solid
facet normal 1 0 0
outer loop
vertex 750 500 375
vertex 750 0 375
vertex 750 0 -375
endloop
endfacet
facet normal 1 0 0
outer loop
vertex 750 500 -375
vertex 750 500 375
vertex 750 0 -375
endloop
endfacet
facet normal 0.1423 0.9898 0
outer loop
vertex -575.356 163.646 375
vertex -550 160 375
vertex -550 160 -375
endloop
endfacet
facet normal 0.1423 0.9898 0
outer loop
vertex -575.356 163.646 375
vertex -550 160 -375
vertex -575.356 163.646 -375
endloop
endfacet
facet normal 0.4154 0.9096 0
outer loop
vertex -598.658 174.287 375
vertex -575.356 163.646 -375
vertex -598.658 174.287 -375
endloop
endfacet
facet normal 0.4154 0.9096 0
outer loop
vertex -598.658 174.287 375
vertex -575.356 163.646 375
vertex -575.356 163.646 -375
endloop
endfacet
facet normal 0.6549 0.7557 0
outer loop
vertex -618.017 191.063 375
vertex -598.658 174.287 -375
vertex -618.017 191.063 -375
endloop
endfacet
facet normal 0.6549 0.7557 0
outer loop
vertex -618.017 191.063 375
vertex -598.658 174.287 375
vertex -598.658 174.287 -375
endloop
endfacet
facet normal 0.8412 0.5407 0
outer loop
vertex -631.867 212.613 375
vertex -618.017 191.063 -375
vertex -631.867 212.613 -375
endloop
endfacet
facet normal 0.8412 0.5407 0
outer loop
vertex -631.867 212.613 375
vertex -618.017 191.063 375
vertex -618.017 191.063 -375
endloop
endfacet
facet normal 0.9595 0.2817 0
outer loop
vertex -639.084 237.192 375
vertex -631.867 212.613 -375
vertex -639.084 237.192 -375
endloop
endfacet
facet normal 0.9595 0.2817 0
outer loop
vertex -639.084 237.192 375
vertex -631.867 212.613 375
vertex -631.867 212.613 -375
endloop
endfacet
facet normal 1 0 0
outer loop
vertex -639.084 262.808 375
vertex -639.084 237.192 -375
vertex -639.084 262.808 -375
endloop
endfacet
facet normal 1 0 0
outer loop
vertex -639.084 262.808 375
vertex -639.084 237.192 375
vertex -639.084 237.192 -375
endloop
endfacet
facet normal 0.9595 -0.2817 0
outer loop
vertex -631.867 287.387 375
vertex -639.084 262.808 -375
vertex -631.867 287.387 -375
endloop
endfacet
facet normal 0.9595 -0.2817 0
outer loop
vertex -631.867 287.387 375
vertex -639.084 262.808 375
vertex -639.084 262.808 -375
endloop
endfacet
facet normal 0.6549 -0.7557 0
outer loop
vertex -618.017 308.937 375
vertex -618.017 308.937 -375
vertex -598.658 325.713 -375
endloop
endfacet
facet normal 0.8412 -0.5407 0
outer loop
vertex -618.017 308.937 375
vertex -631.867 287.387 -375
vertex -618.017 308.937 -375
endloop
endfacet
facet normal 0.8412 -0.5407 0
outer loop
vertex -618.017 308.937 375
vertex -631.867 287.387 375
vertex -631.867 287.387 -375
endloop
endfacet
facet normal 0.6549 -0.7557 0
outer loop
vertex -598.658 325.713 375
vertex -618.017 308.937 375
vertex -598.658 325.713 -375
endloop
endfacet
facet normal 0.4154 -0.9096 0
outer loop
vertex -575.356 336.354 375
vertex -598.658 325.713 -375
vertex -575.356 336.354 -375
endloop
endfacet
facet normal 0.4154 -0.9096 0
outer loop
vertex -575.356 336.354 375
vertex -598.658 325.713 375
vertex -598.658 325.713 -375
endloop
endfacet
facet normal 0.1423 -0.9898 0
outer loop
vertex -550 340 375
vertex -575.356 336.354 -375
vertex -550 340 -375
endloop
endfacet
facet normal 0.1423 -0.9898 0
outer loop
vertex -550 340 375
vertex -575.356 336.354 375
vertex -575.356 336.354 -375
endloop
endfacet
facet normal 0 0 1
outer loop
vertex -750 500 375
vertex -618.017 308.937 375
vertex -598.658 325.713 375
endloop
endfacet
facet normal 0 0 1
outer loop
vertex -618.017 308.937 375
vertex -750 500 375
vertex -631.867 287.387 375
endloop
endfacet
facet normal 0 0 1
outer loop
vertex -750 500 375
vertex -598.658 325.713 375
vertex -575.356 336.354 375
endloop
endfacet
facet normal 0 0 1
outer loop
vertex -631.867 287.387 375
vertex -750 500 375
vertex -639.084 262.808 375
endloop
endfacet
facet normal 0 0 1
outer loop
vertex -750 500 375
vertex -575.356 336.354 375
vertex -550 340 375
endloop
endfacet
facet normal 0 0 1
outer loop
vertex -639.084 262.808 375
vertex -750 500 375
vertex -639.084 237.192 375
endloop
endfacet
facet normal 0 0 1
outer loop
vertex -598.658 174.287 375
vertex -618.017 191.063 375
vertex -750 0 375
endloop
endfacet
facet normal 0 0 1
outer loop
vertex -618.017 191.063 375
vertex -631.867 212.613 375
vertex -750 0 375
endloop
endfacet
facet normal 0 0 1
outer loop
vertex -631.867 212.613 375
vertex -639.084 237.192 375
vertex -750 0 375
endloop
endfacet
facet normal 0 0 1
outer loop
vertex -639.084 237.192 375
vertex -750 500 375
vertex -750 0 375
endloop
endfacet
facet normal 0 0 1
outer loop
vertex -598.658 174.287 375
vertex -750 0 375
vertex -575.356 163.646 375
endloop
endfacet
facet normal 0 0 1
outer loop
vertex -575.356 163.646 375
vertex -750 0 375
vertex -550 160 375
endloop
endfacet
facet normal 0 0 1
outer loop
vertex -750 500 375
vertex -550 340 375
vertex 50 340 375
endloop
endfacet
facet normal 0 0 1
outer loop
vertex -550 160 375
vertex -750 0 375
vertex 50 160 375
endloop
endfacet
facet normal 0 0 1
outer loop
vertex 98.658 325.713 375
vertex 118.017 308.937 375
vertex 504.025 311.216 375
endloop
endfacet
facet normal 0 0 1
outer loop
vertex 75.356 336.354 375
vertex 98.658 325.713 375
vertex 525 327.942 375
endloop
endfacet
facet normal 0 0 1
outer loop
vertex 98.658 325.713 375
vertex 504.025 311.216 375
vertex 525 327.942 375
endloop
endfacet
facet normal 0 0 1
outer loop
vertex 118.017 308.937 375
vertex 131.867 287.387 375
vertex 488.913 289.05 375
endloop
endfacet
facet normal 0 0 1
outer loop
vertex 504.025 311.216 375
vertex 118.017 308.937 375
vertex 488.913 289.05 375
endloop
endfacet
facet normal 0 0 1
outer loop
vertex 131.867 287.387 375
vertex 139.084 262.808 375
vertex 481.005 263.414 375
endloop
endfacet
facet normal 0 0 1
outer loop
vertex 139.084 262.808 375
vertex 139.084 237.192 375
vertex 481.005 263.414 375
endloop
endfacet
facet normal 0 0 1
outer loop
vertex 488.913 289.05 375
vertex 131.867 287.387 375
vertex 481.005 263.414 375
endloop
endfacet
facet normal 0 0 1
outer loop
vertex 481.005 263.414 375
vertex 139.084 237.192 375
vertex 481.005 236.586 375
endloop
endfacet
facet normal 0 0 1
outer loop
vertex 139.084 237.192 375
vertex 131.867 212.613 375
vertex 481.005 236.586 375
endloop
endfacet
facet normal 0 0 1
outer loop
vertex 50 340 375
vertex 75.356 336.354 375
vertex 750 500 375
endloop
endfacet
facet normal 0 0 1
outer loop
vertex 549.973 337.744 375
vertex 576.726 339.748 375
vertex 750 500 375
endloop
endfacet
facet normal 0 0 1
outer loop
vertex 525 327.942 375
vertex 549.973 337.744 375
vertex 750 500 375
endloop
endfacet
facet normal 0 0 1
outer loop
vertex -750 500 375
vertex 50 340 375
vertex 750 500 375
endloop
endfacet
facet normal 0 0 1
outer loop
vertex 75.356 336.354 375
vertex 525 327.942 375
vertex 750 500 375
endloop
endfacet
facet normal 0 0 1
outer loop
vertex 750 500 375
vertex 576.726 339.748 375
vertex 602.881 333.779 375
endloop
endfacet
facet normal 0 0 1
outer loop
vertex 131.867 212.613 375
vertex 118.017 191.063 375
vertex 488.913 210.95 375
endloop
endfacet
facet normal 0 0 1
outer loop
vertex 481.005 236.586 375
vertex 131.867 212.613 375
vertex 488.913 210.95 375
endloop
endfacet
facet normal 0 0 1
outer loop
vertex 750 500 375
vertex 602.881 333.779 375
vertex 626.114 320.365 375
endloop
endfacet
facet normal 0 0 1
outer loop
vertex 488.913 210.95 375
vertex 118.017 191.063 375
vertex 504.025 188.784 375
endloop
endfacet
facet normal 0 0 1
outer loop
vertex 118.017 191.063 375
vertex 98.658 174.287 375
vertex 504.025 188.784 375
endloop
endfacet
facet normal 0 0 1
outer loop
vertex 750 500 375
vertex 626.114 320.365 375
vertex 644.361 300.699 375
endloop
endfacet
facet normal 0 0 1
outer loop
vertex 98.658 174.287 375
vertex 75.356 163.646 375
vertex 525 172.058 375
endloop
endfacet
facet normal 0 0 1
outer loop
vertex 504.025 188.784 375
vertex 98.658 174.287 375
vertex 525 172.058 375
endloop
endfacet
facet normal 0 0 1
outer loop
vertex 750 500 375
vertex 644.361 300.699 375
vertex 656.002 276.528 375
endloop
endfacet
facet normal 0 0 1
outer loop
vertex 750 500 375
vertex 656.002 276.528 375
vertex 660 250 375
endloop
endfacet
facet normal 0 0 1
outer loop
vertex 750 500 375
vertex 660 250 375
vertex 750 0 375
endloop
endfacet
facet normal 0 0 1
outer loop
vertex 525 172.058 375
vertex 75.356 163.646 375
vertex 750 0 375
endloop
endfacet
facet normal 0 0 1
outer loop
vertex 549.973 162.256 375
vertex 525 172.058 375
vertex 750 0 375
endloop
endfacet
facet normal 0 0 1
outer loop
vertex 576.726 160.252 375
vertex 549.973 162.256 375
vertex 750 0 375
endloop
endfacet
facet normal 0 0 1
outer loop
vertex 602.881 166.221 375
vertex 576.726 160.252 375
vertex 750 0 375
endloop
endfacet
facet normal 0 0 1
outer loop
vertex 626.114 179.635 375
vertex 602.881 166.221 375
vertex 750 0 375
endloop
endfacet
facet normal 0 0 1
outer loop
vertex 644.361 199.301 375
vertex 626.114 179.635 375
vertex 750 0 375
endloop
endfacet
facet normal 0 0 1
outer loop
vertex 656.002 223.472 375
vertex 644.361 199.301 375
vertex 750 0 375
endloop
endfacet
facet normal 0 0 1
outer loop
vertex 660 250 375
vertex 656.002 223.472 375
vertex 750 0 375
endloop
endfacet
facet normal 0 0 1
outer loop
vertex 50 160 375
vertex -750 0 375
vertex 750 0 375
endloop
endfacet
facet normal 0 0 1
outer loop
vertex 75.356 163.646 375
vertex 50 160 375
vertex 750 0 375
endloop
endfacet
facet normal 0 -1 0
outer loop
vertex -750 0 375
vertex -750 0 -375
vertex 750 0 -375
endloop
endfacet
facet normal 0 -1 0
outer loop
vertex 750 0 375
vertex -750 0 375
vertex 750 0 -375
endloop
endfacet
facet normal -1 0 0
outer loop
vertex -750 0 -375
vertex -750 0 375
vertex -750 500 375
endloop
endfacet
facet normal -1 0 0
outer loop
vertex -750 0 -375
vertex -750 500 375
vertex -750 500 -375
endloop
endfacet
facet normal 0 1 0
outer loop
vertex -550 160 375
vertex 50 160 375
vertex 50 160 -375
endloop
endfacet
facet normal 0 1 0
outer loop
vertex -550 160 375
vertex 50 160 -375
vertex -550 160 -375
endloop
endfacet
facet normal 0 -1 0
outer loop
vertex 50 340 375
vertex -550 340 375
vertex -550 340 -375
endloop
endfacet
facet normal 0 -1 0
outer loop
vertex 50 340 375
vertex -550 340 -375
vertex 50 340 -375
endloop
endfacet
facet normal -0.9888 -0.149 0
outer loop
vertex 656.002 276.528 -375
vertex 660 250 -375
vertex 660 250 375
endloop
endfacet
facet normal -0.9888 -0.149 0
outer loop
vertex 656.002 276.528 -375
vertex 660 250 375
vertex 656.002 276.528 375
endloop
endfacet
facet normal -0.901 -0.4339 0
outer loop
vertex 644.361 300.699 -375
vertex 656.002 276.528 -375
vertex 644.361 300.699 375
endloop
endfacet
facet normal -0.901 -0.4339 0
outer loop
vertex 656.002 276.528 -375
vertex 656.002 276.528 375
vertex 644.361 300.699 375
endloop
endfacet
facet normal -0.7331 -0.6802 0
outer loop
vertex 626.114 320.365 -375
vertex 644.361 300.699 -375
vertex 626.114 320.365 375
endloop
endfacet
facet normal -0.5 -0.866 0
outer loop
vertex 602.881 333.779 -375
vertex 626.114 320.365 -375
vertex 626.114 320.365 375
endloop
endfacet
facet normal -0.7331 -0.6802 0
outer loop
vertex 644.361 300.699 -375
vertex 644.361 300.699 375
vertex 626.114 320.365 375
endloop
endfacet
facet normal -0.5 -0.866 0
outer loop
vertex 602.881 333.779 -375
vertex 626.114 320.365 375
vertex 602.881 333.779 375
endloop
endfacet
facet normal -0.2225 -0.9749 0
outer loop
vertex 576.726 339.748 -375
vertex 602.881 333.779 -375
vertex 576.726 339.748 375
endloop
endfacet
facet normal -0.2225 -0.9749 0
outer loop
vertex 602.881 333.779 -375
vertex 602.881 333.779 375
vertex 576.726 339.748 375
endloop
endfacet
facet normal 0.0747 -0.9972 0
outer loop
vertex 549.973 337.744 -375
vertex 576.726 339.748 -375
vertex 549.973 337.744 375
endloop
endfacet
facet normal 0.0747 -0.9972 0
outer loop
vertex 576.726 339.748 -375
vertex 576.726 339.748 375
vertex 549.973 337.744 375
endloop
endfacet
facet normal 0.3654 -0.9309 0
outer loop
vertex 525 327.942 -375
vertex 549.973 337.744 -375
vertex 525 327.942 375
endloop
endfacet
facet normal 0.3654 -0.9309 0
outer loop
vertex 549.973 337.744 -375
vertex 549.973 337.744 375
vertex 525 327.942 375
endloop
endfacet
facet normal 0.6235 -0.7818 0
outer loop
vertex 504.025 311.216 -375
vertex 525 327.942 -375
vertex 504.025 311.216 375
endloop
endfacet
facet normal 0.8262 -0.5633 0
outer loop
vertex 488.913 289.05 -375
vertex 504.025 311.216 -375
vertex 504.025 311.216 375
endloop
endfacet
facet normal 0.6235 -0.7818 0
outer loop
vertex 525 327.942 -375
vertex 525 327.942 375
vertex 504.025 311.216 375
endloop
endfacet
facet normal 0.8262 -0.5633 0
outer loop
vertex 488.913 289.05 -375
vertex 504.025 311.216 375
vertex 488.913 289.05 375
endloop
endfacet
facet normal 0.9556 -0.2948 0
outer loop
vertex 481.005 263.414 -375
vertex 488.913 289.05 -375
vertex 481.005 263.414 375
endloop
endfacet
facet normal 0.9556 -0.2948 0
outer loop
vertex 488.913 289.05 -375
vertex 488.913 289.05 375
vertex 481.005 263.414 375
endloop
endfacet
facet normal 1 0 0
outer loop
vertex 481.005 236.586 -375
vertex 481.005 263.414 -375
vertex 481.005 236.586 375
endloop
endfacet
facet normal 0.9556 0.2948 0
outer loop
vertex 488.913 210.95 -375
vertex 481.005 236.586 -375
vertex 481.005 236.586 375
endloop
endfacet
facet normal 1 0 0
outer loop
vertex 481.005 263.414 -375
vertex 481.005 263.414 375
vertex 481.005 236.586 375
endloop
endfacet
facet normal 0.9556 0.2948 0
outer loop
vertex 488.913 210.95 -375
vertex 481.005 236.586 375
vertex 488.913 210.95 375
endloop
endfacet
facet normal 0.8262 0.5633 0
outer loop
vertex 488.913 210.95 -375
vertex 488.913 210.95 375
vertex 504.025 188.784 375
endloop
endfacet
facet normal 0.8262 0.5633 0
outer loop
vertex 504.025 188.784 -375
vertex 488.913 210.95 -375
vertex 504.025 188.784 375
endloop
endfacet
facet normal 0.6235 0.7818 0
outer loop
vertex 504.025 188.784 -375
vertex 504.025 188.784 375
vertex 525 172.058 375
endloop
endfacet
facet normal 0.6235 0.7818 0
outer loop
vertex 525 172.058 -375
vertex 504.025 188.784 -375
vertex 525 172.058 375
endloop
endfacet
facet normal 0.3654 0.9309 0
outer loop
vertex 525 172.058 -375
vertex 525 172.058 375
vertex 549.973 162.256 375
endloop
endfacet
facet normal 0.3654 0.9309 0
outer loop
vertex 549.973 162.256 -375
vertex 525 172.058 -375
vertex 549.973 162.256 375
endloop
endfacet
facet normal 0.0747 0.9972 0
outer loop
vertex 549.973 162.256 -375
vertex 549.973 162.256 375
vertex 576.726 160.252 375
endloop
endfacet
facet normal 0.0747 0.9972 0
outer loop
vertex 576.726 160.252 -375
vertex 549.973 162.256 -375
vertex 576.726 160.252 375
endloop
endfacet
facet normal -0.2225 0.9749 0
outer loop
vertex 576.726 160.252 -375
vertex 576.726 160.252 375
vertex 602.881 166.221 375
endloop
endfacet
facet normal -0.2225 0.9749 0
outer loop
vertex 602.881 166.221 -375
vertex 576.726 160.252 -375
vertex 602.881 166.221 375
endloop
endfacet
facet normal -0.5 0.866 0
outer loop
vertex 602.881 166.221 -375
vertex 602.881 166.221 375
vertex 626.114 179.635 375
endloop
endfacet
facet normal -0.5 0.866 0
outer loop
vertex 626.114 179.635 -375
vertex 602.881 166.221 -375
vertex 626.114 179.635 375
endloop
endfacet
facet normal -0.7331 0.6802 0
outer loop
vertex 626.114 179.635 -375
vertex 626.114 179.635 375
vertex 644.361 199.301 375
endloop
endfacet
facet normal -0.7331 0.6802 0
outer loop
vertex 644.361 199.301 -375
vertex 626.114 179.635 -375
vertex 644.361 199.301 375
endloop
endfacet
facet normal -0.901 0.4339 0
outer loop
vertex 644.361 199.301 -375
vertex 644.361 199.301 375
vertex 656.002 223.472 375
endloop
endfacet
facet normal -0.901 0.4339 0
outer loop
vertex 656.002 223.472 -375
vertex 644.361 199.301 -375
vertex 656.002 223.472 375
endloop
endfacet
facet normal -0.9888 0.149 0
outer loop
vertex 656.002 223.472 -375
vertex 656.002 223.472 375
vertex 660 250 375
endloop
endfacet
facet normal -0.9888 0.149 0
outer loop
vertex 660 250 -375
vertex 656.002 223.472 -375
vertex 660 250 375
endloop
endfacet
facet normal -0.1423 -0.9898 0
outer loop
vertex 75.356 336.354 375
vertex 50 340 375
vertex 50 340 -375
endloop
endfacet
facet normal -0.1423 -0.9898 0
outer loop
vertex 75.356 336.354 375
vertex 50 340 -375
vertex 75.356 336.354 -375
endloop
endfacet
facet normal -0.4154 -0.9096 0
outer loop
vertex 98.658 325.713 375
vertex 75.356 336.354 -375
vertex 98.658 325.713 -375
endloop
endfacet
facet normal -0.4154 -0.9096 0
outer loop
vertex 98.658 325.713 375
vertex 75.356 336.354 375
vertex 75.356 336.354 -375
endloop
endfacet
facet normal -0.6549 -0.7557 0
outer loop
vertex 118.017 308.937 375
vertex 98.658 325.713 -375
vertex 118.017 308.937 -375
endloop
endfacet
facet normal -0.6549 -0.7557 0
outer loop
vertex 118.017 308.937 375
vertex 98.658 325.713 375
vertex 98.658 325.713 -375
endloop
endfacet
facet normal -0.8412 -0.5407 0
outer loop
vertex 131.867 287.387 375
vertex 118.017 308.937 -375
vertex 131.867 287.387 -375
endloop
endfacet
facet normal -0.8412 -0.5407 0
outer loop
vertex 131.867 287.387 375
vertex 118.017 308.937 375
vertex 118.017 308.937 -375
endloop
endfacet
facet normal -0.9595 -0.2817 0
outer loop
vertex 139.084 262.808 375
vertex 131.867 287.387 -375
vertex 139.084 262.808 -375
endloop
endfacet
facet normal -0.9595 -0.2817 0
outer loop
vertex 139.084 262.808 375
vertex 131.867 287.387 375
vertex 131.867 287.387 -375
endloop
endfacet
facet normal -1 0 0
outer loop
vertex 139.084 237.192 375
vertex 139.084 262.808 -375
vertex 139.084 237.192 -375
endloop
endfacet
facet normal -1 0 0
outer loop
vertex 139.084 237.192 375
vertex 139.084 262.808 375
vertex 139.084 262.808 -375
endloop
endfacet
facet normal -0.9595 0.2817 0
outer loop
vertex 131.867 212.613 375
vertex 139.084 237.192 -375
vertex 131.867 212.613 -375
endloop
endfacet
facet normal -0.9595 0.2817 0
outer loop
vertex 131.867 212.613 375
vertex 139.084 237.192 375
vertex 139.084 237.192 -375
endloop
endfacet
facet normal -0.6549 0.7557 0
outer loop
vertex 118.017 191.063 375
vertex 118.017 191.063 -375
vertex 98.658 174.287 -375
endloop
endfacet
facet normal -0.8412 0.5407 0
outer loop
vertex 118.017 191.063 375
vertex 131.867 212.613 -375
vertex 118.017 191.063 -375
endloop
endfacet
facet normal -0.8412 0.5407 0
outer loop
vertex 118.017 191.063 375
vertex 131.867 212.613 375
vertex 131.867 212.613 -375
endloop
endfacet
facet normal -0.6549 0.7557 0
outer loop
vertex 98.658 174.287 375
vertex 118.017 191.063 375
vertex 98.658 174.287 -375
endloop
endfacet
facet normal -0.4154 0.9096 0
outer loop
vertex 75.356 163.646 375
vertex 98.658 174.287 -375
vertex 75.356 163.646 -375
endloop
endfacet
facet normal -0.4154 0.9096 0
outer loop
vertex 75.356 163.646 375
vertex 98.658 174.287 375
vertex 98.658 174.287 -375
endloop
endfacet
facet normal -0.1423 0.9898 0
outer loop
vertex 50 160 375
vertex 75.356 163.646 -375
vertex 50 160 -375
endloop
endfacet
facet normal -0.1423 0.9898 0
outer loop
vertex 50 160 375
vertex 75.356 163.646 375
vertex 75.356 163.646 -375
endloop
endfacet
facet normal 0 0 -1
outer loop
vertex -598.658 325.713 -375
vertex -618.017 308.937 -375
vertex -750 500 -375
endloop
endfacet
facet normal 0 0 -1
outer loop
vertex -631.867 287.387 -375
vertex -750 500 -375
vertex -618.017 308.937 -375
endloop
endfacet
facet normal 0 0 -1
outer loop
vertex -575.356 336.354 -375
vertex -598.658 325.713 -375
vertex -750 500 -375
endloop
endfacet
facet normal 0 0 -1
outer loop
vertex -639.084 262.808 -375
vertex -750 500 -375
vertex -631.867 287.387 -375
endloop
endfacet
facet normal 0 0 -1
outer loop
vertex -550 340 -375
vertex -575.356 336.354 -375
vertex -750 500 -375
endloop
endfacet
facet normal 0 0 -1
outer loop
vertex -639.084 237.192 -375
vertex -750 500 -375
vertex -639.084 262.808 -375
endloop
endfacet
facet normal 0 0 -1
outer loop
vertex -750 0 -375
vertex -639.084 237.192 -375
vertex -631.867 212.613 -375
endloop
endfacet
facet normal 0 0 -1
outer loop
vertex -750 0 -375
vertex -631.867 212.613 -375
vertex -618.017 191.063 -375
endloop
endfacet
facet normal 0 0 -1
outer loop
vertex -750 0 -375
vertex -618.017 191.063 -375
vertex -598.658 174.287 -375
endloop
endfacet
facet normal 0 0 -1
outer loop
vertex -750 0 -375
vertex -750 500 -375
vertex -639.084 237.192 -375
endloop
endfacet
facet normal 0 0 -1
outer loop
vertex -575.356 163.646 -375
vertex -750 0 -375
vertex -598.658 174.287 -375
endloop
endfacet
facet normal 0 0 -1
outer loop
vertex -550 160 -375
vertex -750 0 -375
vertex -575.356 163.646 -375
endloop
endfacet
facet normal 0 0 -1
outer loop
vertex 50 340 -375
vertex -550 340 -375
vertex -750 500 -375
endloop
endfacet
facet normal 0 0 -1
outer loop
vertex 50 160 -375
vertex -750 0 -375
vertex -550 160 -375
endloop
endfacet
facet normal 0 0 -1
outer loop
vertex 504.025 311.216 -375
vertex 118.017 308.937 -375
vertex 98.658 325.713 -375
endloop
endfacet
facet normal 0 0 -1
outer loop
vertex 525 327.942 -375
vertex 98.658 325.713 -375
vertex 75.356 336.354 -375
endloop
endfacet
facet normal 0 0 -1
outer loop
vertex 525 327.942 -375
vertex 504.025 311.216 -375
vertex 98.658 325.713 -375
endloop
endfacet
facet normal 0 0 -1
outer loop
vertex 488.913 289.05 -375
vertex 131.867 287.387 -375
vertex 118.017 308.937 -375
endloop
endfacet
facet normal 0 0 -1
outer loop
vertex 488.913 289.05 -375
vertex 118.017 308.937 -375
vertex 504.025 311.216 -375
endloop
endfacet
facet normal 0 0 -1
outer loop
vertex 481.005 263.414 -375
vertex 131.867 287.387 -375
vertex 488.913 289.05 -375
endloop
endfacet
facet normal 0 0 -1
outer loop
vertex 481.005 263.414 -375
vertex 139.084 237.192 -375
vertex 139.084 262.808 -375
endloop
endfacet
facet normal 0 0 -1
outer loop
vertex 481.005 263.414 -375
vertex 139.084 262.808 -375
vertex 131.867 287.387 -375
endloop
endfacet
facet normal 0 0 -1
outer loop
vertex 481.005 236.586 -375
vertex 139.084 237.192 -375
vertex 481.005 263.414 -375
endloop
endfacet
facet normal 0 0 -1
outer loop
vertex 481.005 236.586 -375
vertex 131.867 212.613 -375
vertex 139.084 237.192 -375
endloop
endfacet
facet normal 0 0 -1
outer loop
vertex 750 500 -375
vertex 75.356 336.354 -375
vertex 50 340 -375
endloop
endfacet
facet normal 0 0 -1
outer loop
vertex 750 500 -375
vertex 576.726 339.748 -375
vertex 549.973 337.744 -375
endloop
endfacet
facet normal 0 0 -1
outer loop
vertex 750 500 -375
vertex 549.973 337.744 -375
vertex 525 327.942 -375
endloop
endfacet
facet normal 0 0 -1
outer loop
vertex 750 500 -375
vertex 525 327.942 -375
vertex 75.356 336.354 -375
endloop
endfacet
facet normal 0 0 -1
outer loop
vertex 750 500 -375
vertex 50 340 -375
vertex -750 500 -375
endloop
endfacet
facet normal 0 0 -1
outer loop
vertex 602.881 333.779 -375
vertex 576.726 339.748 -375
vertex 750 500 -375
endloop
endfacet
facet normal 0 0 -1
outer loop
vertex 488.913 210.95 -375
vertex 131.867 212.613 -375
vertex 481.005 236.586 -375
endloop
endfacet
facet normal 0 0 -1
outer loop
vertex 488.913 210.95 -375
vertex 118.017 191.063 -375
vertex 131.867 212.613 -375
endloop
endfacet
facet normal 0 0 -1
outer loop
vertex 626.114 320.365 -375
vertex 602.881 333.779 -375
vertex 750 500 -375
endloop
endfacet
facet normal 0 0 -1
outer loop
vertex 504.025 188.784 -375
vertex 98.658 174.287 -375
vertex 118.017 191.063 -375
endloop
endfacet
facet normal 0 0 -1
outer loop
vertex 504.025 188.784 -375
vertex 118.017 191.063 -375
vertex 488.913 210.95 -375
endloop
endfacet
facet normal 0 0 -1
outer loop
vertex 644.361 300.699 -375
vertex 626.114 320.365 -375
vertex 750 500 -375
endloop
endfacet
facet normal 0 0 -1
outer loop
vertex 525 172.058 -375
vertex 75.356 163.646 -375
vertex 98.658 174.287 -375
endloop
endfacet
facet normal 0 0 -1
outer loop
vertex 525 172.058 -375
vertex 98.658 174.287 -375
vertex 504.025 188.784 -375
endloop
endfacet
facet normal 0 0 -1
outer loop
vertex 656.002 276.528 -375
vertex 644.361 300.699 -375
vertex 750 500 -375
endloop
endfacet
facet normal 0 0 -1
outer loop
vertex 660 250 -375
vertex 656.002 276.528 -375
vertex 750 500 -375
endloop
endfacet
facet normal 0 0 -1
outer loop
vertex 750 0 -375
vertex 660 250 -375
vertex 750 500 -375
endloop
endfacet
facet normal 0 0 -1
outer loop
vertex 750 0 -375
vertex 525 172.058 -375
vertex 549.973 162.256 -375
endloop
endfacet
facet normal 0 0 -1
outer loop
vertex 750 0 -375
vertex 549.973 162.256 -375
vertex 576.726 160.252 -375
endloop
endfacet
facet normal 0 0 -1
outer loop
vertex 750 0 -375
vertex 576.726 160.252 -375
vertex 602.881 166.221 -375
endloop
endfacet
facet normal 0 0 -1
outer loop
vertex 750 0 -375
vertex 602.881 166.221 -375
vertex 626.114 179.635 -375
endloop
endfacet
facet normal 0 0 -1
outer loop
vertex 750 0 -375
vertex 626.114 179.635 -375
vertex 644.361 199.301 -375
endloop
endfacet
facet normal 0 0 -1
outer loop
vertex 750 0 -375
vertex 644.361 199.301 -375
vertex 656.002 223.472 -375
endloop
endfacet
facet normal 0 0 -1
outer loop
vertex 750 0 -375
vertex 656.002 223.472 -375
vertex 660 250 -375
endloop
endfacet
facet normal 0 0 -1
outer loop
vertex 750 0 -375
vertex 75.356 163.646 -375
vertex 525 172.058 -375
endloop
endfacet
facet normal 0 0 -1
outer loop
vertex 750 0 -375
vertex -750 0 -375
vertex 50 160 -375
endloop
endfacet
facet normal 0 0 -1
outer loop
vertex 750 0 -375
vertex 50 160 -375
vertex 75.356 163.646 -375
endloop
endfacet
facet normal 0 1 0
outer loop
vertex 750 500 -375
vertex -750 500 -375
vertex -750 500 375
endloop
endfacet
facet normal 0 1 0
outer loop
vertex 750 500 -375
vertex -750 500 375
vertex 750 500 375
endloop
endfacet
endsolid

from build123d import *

# Parameters (mm, degrees)
SKETCH1_W           = 1500
SKETCH1_H           = 750
BOSS_EXTRUDE1_DEPTH = 500
SKETCH2_R           = 90
CUT_EXTRUDE1_DEPTH  = 1173.603939956


with BuildPart() as part:
    # Sketch1 → Boss-Extrude1 (new body)
    with BuildSketch(Plane(origin=(0, 0, 0), x_dir=(1, 0, 0), z_dir=(0, 1, 0))):
        Rectangle(SKETCH1_W, SKETCH1_H)
    extrude(amount=BOSS_EXTRUDE1_DEPTH)

    # Sketch2 → Cut-Extrude1 (cut, through all)
    with BuildSketch(Plane.XY.offset(375)):
        with Locations((570, 250)):
            Circle(SKETCH2_R)
        with BuildLine():
            Line((-550, 340), (50, 340))
            ThreePointArc((50, 340), (140, 250), (50, 160))
            Line((50, 160), (-550, 160))
            ThreePointArc((-550, 160), (-640, 250), (-550, 340))
        make_face()
    extrude(amount=-CUT_EXTRUDE1_DEPTH, mode=Mode.SUBTRACT)


solid = part.part
